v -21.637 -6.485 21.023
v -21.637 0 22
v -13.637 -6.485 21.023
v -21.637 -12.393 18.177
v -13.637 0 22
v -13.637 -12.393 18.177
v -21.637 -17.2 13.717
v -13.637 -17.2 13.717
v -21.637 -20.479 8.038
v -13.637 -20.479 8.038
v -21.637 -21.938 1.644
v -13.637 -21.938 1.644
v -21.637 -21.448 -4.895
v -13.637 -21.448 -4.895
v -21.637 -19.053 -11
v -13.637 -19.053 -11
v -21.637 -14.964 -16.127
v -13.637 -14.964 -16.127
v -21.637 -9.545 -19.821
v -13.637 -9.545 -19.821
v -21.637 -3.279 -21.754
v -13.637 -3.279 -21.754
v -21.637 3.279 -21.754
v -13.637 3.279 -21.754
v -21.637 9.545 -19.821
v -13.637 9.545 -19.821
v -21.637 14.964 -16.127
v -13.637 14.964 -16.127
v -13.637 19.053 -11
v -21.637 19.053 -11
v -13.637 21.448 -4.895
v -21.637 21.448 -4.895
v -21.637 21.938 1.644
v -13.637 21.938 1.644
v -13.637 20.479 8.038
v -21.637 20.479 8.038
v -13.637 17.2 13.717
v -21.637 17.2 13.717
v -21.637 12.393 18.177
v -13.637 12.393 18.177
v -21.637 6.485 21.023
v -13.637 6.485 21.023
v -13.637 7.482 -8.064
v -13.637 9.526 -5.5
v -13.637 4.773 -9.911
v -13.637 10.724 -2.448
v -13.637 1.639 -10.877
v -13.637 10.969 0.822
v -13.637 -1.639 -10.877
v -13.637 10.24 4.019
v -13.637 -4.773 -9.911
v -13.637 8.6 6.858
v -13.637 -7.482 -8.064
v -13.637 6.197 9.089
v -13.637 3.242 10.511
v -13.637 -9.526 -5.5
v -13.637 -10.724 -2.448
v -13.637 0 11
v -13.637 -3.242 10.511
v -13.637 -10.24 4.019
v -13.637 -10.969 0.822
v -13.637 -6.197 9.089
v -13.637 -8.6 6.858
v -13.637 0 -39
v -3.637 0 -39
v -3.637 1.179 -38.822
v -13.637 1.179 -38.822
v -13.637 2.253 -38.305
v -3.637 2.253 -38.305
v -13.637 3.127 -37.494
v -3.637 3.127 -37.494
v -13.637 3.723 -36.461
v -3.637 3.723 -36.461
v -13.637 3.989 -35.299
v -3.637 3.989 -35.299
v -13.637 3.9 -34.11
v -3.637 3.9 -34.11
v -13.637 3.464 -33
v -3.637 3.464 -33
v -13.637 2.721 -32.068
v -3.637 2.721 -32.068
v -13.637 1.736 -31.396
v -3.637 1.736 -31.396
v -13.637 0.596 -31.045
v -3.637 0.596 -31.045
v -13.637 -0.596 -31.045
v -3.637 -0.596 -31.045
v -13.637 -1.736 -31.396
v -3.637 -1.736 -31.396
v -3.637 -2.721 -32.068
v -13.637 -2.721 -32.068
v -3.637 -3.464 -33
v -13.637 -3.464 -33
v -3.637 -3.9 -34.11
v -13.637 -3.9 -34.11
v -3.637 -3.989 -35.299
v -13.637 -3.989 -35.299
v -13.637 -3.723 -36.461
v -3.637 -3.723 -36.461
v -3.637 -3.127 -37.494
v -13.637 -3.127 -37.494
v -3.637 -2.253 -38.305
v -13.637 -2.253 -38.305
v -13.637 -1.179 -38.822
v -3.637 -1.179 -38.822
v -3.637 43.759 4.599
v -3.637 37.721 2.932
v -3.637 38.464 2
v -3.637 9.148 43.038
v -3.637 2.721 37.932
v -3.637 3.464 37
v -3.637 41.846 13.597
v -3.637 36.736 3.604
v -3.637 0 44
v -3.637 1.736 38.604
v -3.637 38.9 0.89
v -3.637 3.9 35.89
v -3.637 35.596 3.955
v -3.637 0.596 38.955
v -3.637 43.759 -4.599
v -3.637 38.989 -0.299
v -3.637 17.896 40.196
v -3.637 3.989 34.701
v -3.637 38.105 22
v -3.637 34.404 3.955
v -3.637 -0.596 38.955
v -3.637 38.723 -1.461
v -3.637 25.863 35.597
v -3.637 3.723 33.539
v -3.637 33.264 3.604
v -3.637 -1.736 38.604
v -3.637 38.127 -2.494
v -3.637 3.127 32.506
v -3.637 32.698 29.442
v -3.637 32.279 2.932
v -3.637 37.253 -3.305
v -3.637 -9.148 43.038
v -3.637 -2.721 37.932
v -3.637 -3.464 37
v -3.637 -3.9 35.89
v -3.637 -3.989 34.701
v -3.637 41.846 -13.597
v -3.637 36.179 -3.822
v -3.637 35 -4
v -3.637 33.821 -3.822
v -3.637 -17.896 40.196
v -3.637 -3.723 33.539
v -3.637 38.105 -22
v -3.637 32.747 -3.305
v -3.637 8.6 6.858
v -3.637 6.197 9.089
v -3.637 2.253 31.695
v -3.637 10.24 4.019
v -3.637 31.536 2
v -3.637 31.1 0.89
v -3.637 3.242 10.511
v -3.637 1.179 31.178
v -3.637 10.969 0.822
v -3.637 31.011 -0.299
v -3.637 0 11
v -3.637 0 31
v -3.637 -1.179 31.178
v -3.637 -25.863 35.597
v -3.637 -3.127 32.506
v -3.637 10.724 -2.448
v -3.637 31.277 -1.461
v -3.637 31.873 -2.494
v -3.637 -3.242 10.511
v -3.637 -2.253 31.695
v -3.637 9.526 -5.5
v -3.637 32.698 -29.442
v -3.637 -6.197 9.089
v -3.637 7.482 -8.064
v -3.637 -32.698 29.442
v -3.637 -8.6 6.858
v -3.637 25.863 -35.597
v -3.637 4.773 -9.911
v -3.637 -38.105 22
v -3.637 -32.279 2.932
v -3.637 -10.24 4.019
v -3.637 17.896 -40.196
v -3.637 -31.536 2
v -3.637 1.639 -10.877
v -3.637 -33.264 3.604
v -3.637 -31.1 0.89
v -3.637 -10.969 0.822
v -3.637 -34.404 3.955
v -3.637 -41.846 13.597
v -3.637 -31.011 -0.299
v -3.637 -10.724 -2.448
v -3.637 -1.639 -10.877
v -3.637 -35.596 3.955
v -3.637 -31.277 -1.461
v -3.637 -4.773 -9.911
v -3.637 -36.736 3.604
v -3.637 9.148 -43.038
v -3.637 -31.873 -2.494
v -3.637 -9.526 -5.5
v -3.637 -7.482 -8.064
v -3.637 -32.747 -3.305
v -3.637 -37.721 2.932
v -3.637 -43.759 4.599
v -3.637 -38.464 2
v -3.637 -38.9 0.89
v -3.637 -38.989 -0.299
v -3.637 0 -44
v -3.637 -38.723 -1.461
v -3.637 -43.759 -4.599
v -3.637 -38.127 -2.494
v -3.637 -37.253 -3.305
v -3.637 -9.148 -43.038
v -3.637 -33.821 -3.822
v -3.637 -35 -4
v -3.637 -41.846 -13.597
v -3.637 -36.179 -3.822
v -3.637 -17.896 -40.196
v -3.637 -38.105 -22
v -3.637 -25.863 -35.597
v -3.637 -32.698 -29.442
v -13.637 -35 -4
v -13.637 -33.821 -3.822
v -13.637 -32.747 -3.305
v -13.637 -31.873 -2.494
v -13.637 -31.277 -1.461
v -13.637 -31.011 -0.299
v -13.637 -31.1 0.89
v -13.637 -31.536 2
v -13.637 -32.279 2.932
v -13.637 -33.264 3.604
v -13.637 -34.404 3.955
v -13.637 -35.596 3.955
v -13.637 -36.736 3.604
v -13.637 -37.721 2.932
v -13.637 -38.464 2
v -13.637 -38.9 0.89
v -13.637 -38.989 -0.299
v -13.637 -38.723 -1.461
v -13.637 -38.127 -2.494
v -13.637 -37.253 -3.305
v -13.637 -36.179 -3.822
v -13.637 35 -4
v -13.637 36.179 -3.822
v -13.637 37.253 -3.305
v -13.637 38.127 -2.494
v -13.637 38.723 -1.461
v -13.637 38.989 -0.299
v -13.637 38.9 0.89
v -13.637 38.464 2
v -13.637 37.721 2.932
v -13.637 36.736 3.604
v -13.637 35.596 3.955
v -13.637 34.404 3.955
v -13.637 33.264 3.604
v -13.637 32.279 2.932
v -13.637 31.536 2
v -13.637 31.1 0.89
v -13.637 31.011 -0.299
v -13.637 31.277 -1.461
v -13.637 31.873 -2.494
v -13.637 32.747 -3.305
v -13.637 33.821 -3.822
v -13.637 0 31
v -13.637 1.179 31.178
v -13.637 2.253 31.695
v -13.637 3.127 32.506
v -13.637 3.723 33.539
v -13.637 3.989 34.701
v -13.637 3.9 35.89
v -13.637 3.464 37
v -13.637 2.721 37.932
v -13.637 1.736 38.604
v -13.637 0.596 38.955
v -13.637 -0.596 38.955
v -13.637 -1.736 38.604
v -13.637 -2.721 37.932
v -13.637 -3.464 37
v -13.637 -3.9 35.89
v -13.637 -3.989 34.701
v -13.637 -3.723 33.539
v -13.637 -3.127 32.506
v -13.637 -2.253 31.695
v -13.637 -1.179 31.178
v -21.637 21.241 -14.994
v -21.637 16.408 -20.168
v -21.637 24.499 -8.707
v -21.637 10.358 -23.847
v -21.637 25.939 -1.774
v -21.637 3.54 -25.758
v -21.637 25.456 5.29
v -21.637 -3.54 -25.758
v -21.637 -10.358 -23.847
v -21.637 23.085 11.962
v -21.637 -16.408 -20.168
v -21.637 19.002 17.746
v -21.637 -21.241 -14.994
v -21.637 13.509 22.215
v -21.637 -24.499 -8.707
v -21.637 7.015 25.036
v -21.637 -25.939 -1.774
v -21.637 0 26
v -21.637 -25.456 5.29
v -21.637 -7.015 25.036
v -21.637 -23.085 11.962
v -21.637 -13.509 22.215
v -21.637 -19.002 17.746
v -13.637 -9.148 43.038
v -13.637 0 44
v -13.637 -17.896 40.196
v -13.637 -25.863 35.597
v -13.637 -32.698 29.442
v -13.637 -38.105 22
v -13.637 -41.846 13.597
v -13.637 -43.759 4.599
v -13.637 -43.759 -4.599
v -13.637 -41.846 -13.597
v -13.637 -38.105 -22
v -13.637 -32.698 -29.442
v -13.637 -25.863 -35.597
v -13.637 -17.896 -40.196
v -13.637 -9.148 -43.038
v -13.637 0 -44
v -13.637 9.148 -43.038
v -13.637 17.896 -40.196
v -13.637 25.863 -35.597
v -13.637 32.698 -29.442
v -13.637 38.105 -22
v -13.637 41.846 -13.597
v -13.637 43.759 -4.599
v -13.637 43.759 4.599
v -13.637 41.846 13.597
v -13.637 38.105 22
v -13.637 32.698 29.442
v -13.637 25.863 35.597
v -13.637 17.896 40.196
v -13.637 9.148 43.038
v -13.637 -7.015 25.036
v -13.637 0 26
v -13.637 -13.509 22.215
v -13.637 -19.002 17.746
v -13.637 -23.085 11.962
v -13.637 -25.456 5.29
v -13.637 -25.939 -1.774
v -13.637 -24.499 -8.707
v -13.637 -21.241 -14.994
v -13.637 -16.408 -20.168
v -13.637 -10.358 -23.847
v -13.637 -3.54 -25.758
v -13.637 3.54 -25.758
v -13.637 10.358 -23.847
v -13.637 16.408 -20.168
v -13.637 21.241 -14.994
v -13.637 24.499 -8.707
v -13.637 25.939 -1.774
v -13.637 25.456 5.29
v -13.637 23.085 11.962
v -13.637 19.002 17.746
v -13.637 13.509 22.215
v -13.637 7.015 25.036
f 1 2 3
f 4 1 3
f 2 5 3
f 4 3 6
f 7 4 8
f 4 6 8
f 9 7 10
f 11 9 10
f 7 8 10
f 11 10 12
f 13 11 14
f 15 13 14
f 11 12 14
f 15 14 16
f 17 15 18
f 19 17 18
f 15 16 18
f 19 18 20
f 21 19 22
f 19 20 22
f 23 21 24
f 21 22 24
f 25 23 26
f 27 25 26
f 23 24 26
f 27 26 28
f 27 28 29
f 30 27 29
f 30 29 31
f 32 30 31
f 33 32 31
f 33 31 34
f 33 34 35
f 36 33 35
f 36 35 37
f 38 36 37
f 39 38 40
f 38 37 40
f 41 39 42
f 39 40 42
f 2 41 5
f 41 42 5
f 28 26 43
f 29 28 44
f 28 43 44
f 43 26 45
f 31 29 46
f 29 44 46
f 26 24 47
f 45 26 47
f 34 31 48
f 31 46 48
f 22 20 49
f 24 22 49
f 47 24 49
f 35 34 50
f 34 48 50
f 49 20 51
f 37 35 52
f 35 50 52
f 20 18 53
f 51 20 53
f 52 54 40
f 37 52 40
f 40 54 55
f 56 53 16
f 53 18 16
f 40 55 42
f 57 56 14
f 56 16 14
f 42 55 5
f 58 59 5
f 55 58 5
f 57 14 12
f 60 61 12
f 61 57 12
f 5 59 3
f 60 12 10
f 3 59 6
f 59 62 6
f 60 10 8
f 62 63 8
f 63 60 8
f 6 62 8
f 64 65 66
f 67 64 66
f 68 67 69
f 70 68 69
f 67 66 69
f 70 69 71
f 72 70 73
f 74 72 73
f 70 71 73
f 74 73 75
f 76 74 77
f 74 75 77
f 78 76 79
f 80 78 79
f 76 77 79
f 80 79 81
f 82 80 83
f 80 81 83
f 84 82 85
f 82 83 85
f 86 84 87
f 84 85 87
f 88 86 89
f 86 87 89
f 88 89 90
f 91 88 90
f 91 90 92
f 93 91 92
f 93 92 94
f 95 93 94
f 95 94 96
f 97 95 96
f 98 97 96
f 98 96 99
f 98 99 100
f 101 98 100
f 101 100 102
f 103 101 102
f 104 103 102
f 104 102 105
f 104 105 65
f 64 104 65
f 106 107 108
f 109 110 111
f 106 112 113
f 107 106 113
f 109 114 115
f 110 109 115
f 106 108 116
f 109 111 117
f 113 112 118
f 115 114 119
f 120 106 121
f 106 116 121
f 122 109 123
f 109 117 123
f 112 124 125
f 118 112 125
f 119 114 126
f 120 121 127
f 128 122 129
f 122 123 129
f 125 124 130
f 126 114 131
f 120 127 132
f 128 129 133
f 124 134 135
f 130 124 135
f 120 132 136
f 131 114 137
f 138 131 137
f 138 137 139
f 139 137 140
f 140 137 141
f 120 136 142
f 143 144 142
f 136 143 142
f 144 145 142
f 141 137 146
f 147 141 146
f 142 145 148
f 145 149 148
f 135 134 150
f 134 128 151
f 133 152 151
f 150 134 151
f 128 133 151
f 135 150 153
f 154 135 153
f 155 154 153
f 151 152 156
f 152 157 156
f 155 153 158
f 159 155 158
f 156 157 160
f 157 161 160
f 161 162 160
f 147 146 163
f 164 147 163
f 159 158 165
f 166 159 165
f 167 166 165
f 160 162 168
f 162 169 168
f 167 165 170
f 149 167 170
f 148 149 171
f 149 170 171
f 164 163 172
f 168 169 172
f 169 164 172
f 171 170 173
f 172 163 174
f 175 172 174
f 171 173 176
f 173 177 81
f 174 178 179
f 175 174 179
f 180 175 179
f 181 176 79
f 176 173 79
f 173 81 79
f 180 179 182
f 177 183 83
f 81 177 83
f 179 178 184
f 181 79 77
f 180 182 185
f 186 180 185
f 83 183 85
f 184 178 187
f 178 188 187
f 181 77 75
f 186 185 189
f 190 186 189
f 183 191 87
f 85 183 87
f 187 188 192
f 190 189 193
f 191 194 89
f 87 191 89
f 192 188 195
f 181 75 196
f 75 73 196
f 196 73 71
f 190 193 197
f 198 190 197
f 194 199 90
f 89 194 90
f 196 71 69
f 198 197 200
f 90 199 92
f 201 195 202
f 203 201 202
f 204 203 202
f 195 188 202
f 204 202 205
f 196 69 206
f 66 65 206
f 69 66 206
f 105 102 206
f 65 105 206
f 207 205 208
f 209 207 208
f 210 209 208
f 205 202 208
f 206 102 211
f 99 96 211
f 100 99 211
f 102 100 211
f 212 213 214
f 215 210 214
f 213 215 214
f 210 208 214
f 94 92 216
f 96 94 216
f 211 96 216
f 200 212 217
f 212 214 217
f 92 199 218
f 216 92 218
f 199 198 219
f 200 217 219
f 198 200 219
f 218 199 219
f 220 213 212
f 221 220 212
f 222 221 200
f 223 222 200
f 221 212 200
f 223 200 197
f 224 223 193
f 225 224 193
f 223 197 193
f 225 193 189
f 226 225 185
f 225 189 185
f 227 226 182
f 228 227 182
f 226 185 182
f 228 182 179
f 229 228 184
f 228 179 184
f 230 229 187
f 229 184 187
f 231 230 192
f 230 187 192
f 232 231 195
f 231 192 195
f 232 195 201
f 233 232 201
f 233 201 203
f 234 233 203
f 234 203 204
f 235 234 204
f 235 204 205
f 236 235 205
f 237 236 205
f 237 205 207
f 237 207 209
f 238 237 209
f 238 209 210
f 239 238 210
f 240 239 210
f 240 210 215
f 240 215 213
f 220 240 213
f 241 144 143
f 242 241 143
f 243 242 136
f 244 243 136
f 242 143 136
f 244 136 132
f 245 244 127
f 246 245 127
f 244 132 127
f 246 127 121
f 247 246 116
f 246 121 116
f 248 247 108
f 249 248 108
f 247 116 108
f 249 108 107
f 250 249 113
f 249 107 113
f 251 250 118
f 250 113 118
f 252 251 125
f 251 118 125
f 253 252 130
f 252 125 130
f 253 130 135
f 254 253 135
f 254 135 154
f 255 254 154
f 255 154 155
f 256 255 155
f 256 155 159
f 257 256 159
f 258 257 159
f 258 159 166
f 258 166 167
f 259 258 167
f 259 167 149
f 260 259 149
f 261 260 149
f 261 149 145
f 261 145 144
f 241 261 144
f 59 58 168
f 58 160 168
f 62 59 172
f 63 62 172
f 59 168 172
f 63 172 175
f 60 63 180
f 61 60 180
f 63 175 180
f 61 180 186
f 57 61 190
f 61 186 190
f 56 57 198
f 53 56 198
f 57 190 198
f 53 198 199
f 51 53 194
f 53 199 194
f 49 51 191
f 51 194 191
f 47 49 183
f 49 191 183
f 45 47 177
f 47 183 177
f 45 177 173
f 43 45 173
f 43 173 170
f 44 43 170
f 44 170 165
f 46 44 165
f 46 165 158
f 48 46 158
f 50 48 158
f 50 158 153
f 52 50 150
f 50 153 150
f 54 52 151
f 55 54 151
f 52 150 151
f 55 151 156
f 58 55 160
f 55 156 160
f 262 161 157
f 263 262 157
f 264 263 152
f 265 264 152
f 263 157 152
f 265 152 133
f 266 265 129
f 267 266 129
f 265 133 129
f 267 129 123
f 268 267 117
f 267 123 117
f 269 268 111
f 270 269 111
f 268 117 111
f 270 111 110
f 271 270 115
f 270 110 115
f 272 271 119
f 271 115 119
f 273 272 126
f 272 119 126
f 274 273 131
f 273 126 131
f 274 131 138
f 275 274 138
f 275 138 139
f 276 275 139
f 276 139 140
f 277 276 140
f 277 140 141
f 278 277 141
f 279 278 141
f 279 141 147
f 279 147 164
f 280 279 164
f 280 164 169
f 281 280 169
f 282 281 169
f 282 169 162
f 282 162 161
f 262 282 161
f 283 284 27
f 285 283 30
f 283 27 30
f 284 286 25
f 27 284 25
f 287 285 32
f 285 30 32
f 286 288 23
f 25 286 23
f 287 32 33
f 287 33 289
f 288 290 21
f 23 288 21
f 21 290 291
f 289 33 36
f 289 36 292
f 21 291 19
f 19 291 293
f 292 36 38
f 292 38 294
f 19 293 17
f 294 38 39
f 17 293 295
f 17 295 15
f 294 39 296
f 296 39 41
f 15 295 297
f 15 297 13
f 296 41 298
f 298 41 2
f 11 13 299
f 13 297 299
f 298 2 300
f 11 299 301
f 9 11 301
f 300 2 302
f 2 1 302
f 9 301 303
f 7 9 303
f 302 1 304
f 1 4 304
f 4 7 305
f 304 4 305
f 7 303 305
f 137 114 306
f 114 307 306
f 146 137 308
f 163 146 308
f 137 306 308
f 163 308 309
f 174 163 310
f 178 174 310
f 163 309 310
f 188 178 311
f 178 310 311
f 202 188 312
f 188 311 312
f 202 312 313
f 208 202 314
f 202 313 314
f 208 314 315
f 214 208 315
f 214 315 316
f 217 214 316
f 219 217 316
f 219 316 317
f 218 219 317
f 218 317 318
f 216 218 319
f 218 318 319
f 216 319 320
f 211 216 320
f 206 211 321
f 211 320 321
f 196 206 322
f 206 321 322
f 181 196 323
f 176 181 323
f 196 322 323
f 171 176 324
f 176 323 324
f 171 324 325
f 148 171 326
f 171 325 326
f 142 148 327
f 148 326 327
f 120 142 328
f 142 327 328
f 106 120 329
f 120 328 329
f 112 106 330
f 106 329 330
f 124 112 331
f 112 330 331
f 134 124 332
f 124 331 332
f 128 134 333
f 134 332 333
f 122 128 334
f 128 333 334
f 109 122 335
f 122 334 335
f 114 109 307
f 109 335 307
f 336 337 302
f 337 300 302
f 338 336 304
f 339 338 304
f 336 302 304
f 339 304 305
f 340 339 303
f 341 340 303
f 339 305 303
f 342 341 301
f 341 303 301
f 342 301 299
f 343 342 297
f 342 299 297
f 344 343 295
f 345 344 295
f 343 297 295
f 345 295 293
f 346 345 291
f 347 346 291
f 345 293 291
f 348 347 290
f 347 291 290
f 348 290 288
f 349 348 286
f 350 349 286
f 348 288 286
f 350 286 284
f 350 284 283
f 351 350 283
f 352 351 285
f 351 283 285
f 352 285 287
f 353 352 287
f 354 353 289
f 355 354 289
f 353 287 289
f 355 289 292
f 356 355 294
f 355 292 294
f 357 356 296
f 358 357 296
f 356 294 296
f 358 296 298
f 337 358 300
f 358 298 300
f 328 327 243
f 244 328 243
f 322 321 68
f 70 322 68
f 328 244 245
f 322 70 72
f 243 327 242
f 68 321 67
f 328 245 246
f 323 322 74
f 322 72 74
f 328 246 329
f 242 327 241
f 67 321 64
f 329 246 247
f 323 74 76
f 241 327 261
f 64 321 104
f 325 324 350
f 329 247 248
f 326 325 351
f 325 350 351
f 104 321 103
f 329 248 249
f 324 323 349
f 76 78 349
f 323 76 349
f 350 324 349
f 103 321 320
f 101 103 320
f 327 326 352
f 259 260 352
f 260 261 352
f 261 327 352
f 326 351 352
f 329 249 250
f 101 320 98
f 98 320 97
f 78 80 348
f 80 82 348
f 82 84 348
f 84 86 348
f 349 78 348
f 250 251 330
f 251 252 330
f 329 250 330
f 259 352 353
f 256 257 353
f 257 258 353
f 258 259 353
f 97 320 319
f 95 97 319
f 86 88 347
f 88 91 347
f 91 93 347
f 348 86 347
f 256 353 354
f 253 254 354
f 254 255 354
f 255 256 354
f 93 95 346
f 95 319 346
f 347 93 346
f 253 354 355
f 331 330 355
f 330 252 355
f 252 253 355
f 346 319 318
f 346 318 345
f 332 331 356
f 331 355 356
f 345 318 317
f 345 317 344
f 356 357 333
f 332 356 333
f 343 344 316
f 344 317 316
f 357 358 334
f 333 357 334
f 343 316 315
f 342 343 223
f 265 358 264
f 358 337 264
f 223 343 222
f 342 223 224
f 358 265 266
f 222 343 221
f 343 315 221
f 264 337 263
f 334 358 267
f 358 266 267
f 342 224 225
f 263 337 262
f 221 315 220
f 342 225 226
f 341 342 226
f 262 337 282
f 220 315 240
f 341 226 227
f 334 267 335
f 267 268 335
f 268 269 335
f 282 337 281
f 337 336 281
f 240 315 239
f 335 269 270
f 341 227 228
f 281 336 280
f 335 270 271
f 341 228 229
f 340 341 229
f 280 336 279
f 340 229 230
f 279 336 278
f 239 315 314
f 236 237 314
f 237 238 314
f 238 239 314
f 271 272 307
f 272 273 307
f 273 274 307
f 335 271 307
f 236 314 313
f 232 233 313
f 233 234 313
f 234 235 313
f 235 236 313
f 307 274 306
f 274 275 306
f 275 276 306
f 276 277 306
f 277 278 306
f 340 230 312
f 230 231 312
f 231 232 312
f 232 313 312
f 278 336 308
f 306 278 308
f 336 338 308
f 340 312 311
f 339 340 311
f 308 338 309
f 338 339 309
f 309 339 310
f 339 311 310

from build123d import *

# Parameters (mm, degrees)
SKETCH2_R          = 4
CUT_EXTRUDE1_DEPTH = 65.776538963


with BuildPart() as part:
    # Sketch1 → Revolve1 (revolve)
    with BuildSketch(Plane.XY, mode=Mode.PRIVATE) as revolve1_sk:
        Polygon((-13.637426901, 11), (-3.637426901, 11), (-3.637426901, 44), (-13.637426901, 44), (-13.637426901, 26), (-21.637426901, 26), (-21.637426901, 22), (-13.637426901, 22), align=None)
    revolve(revolve1_sk.sketch.rotate(Axis((-28.771929825, 0, 0), (1, 0, 0)), 90), axis=Axis((-28.771929825, 0, 0), (1, 0, 0)))

    # Sketch2 → Cut-Extrude1 (cut, through all)
    with BuildSketch(Plane(origin=(-3.637426901, 0, 0), x_dir=(0, 0, -1), z_dir=(1, 0, 0))):
        with Locations((0, 35)):
            Circle(SKETCH2_R)
        with Locations((35, 0)):
            Circle(SKETCH2_R)
        with Locations((0, -35)):
            Circle(SKETCH2_R)
        with Locations((-35, 0)):
            Circle(SKETCH2_R)
    extrude(amount=-CUT_EXTRUDE1_DEPTH, mode=Mode.SUBTRACT)


solid = part.part
